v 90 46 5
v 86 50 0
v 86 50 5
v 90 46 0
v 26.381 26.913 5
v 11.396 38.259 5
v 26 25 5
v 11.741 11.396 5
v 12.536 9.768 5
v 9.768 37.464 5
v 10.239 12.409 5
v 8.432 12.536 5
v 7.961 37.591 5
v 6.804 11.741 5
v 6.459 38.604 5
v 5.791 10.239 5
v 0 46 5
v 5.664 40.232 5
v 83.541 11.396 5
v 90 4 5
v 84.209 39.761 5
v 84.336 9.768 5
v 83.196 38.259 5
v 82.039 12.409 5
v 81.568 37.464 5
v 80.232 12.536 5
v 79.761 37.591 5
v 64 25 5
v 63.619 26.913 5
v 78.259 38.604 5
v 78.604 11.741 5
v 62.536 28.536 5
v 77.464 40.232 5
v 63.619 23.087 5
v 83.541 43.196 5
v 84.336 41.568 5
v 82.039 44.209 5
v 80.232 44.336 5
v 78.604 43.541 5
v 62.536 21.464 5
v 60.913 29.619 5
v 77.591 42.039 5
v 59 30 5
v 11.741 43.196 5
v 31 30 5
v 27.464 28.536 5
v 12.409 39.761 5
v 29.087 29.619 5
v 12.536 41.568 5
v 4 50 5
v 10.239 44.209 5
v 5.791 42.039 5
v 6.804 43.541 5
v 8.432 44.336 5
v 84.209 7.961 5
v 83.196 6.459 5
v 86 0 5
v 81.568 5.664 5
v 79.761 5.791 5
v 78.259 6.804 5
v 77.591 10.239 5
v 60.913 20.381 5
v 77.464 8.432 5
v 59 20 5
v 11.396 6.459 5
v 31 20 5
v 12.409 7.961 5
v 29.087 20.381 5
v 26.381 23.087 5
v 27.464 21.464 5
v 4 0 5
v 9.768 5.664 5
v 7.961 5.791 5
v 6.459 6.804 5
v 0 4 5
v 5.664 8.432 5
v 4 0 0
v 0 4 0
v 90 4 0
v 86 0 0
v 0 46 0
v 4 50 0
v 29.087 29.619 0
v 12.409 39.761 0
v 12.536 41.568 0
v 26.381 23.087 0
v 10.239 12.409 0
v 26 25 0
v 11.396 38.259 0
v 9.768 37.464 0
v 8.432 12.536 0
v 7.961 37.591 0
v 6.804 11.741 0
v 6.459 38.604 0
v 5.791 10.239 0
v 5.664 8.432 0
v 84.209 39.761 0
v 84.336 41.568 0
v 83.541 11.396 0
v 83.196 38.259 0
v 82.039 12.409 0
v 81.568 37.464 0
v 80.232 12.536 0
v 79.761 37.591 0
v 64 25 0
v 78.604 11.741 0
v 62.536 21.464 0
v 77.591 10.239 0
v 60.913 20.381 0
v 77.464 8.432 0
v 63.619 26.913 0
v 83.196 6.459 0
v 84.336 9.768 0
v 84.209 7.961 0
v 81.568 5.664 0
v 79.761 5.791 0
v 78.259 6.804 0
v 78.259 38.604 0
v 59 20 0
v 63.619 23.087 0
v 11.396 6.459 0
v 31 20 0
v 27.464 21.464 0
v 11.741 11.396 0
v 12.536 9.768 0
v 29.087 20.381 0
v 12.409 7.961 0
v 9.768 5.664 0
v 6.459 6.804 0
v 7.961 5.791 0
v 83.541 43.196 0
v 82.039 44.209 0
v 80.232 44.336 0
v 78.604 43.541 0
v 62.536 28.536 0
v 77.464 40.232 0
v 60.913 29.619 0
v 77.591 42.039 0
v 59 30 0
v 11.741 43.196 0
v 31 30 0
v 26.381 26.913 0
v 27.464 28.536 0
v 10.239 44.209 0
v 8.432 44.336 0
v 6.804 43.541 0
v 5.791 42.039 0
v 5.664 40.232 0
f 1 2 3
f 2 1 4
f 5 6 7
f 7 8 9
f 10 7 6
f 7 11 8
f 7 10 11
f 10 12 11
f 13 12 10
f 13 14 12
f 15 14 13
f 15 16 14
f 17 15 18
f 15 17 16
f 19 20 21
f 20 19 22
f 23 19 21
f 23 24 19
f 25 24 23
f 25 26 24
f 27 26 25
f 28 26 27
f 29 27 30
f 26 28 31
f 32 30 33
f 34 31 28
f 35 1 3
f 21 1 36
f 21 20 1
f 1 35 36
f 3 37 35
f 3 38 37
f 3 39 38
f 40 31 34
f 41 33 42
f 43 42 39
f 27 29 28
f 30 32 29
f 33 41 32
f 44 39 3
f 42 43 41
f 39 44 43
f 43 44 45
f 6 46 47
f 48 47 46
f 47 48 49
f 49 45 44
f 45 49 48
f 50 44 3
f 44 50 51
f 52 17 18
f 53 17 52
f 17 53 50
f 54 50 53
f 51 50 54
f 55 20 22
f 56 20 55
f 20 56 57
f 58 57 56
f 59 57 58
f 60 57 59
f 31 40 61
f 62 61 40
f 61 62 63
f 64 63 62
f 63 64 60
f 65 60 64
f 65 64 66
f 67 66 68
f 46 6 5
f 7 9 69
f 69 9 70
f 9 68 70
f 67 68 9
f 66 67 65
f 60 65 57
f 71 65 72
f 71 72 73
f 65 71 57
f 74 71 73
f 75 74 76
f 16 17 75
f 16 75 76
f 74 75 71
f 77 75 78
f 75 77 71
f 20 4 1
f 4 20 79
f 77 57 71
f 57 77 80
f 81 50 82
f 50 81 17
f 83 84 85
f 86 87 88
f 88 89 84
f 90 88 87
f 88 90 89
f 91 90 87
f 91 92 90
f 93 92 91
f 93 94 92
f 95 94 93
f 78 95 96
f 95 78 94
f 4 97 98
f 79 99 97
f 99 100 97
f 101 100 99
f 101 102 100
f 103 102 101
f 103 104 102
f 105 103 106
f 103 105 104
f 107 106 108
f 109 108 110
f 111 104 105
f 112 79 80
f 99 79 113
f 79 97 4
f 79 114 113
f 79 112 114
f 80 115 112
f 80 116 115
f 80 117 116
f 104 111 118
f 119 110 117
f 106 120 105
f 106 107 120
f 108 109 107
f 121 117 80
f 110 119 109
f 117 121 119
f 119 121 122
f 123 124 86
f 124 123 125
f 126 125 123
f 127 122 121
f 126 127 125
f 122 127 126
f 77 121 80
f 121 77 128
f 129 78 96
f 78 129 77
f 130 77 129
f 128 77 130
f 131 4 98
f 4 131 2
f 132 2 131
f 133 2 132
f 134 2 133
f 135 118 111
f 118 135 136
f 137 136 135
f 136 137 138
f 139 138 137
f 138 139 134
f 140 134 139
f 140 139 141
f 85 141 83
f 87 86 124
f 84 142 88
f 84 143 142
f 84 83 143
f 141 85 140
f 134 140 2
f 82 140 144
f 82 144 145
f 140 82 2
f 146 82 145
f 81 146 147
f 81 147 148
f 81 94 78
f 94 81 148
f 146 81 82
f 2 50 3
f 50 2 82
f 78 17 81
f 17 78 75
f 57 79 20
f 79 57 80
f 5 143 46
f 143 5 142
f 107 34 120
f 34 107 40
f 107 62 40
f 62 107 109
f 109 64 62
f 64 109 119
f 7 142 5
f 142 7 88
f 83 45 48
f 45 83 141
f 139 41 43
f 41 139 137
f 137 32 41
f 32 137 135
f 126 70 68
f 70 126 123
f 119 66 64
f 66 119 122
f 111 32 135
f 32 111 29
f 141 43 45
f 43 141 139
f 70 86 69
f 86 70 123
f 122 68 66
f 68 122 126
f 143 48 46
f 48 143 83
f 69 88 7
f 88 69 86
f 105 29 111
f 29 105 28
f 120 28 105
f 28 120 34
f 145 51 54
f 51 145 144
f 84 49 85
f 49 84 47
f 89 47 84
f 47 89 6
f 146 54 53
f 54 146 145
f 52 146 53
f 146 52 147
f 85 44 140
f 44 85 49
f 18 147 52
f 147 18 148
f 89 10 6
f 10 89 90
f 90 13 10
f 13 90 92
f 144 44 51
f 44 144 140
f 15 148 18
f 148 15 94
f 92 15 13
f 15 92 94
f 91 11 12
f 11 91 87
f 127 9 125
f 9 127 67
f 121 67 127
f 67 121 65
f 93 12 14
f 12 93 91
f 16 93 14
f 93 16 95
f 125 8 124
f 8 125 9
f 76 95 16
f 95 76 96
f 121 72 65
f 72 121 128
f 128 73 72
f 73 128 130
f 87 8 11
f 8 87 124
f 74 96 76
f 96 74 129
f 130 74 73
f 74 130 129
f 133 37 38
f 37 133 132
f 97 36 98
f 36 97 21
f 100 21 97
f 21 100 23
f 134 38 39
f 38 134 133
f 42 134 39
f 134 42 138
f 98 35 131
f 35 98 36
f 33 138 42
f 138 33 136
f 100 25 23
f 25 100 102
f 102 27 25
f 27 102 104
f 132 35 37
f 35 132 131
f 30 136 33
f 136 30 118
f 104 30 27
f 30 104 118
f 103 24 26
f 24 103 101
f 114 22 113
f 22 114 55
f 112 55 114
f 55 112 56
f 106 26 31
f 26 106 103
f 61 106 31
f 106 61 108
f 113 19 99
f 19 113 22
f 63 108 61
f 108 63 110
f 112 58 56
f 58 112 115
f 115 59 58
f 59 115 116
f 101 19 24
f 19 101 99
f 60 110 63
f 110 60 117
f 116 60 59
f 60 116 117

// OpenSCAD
$fn = 32;

// ----------------------------------------------------------------------
// Bracket plate: slot plate 90 x 50
// ----------------------------------------------------------------------

// --- parameters (mm) ---
hole_r = 3.5;             // bolt hole radius
plate_t = 5;              // plate thickness, Z (extrusion height)
plate_l = 90;             // plate length
plate_w = 50;             // plate width
slot_l = 28;              // slot straight length
slot_r = 5;               // slot end radius

slot_len = slot_l + 2 * slot_r;
slot_w = 2 * slot_r;
hole_d2 = 2 * hole_r;

profile = [[4, 0], [86, 0], [90, 4], [90, 46], [86, 50], [4, 50], [0, 46], [0, 4]];  // primary outline, 8 points, counter clockwise
void_1 = [[59, 20], [60.913, 20.381], [62.536, 21.464], [63.619, 23.087], [64, 25], [63.619, 26.913], [62.536, 28.536], [60.913, 29.619], [59, 30], [31, 30], [29.087, 29.619], [27.464, 28.536], [26.381, 26.913], [26, 25], [26.381, 23.087], [27.464, 21.464], [29.087, 20.381], [31, 20]];  // grip slot, 18 points
void_2 = [[12.536, 41.568], [11.741, 43.196], [10.239, 44.209], [8.432, 44.336], [6.804, 43.541], [5.791, 42.039], [5.664, 40.232], [6.459, 38.604], [7.961, 37.591], [9.768, 37.464], [11.396, 38.259], [12.409, 39.761]];  // corner hole, 12 points
void_3 = [[12.536, 9.768], [11.741, 11.396], [10.239, 12.409], [8.432, 12.536], [6.804, 11.741], [5.791, 10.239], [5.664, 8.432], [6.459, 6.804], [7.961, 5.791], [9.768, 5.664], [11.396, 6.459], [12.409, 7.961]];  // corner hole, 12 points
void_4 = [[84.336, 41.568], [83.541, 43.196], [82.039, 44.209], [80.232, 44.336], [78.604, 43.541], [77.591, 42.039], [77.464, 40.232], [78.259, 38.604], [79.761, 37.591], [81.568, 37.464], [83.196, 38.259], [84.209, 39.761]];  // corner hole, 12 points
void_5 = [[84.336, 9.768], [83.541, 11.396], [82.039, 12.409], [80.232, 12.536], [78.604, 11.741], [77.591, 10.239], [77.464, 8.432], [78.259, 6.804], [79.761, 5.791], [81.568, 5.664], [83.196, 6.459], [84.209, 7.961]];  // corner hole, 12 points

// --- the one profile operation ---
difference() {
  linear_extrude(height = plate_t) polygon(points = profile);
  translate([0, 0, -1])
    linear_extrude(height = plate_t + 2) polygon(points = void_1);
  translate([0, 0, -1])
    linear_extrude(height = plate_t + 2) polygon(points = void_2);
  translate([0, 0, -1])
    linear_extrude(height = plate_t + 2) polygon(points = void_3);
  translate([0, 0, -1])
    linear_extrude(height = plate_t + 2) polygon(points = void_4);
  translate([0, 0, -1])
    linear_extrude(height = plate_t + 2) polygon(points = void_5);
}
